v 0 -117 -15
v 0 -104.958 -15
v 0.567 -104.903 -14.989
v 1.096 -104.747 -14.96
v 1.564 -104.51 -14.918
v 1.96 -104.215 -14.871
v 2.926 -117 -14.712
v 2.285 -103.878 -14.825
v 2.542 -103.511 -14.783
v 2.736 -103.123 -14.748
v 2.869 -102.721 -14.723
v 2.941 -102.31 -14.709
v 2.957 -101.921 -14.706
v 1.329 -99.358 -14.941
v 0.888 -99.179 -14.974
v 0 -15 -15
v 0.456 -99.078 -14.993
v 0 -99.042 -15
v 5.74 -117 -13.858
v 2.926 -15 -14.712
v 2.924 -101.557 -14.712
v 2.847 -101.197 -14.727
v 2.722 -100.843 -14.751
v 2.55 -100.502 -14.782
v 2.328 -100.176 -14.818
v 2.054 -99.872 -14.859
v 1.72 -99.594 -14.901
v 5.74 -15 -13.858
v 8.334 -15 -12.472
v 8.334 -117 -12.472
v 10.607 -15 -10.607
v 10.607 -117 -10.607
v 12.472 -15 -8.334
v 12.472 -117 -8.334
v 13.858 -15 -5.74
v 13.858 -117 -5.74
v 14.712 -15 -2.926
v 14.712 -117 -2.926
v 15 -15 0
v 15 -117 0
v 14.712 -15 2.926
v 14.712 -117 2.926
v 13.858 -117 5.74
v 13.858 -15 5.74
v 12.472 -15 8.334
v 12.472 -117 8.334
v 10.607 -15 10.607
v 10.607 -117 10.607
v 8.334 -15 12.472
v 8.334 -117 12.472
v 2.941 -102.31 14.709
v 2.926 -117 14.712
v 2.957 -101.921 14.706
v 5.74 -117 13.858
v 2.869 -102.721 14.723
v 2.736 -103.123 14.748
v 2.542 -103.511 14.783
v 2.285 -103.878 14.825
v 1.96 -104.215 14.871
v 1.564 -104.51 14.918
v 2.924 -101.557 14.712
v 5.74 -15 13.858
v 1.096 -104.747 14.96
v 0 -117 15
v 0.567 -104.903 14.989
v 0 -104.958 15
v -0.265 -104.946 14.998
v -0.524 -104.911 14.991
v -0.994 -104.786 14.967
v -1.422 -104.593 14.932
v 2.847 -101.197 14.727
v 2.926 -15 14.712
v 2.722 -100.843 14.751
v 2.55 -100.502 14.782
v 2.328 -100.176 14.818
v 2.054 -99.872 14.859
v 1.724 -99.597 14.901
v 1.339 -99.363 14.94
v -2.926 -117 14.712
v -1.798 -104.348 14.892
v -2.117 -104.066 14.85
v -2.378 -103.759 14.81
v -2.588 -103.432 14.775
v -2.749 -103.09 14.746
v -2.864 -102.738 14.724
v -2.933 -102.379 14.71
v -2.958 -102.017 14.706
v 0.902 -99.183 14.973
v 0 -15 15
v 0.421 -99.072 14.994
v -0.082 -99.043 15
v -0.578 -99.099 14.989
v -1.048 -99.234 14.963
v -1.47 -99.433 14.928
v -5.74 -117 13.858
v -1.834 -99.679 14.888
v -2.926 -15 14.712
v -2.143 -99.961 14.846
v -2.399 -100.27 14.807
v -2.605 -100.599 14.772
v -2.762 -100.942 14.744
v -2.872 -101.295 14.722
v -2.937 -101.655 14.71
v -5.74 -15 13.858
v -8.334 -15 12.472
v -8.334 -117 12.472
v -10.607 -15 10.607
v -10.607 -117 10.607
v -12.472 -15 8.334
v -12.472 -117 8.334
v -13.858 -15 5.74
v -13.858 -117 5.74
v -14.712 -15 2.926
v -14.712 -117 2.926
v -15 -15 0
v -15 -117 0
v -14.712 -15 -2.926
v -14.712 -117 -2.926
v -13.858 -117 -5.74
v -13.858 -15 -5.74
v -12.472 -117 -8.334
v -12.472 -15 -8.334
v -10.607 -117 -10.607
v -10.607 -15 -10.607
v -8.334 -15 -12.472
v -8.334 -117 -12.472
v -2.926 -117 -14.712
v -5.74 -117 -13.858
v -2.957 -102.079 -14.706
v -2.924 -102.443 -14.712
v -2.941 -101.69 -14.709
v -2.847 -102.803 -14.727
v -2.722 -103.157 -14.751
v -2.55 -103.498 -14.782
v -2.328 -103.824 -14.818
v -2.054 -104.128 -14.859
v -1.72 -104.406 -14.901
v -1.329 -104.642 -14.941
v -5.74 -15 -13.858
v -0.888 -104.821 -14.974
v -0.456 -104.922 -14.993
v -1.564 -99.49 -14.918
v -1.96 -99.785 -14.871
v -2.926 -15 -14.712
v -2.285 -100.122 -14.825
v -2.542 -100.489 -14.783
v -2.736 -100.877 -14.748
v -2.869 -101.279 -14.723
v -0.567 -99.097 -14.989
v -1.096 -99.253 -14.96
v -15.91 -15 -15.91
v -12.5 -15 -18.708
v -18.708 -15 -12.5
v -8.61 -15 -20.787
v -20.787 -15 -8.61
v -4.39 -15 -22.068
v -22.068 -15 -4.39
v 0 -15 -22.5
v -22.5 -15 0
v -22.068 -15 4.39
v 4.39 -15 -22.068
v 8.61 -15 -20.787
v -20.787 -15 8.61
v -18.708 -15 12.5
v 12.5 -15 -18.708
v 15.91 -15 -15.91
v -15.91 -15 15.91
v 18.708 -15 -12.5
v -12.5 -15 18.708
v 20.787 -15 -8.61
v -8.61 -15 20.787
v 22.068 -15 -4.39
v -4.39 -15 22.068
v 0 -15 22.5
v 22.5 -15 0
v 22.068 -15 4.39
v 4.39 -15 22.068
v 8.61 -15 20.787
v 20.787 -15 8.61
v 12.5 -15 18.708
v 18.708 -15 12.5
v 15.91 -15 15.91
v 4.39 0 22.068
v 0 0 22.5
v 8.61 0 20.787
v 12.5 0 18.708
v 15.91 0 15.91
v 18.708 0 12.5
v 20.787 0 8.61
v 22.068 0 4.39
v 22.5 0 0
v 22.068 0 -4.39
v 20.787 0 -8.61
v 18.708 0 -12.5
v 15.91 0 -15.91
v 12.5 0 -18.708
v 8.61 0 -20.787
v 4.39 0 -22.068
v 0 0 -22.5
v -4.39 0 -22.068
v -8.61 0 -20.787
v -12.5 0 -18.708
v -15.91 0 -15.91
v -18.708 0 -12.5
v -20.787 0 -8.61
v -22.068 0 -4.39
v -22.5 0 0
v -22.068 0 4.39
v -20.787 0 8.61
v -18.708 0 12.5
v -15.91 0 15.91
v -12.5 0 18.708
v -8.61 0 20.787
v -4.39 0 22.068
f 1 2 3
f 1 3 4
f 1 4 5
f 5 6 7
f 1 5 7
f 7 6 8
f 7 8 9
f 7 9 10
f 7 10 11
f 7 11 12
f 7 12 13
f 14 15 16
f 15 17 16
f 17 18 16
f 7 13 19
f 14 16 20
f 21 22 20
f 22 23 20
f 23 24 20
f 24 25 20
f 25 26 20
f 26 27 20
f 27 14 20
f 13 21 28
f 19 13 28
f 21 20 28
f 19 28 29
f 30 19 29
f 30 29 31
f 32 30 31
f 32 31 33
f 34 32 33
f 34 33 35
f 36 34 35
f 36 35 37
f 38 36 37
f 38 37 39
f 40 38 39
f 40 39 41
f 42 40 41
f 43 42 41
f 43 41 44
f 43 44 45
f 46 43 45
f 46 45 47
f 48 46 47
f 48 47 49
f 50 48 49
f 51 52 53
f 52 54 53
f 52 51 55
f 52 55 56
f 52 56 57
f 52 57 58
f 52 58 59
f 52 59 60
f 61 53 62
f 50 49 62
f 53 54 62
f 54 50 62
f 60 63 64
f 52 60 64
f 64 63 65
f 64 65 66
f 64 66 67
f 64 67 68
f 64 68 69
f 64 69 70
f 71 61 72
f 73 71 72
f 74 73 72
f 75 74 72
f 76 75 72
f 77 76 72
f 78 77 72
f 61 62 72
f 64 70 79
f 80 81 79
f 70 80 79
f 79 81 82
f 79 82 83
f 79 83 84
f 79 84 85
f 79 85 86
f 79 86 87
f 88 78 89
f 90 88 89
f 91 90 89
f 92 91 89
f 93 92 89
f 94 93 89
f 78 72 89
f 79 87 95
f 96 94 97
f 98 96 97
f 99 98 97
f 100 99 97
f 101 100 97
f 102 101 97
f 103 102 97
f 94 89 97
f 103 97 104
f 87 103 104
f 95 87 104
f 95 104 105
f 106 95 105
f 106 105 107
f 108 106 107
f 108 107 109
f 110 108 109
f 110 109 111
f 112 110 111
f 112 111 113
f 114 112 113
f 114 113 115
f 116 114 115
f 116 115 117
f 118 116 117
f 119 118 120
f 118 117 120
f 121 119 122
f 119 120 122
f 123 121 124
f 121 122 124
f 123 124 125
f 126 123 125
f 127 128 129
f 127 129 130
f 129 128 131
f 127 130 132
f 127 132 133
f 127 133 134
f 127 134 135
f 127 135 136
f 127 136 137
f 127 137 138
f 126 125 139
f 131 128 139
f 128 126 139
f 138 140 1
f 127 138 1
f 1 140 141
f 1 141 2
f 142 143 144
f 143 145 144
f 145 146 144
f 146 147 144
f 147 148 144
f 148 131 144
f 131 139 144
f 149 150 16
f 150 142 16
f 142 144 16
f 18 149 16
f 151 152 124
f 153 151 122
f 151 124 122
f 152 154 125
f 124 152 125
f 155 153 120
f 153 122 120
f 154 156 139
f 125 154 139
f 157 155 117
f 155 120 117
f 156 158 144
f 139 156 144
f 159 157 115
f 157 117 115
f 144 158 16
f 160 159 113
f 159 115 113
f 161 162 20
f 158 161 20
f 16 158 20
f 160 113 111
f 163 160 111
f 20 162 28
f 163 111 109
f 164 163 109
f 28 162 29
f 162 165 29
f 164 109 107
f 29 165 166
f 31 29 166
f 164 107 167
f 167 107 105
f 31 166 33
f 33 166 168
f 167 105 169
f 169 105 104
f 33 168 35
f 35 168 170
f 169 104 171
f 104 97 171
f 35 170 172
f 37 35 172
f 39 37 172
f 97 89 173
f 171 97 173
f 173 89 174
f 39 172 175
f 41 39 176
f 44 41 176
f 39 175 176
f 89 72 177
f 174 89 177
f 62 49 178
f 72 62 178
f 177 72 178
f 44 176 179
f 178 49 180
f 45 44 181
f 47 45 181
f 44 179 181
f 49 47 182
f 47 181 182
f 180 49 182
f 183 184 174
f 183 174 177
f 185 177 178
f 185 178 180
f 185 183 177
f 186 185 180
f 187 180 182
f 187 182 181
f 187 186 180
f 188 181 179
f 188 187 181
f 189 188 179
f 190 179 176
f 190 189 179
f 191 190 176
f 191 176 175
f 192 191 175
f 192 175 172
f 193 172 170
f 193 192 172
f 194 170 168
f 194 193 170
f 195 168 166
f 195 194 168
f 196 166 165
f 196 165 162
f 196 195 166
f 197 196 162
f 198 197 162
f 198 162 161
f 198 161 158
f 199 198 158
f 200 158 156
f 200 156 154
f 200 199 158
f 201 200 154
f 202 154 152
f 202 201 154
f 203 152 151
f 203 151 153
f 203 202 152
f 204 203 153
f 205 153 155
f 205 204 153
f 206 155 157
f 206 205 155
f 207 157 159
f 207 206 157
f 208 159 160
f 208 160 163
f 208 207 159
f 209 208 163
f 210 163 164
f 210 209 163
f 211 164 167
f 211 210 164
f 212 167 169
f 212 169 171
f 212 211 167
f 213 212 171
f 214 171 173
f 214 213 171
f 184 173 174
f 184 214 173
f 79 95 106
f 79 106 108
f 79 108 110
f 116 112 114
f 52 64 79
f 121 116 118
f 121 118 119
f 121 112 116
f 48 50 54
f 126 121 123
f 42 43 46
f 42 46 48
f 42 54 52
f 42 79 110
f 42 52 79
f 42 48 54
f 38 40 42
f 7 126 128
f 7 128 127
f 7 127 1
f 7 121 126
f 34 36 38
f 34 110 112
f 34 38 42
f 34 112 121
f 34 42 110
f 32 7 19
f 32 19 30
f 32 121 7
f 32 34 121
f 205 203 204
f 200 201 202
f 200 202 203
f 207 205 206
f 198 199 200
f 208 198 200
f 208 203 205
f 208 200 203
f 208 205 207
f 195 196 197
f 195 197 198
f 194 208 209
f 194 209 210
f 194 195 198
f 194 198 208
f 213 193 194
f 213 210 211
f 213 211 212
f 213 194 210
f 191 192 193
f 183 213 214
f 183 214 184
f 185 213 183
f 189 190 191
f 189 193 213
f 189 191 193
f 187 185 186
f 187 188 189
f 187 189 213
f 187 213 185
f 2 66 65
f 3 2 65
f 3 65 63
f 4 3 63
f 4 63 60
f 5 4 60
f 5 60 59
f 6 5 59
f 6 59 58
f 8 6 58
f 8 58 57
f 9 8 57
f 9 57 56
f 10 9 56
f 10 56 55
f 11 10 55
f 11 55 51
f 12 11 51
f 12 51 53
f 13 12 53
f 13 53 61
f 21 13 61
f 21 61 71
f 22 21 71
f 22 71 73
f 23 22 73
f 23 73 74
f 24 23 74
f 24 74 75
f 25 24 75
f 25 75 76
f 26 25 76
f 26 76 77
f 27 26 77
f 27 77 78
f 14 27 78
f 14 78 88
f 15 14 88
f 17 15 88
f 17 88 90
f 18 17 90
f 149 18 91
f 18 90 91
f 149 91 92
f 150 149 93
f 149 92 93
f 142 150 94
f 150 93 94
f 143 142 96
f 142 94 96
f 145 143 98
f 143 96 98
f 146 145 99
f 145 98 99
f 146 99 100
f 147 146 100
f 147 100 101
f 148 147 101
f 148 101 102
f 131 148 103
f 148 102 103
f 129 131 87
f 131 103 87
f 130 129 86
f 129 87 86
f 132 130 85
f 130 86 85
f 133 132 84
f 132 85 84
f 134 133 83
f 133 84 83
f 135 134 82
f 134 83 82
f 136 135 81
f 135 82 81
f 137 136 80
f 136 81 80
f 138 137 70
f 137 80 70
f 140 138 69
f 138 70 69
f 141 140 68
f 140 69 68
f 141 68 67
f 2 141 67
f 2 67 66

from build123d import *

# Parameters (mm, degrees)
CROQUIS1_R              = 22.5
SALIENTE_EXTRUIR1_DEPTH = 15
CROQUIS2_R              = 15
SALIENTE_EXTRUIR2_DEPTH = 102
CROQUIS4_R              = 2.957727645
CORTAR_EXTRUIR1_DEPTH   = 48.5


with BuildPart() as part:
    # Croquis1 → Saliente-Extruir1 (new body)
    with BuildSketch(Plane(origin=(0, 0, 0), x_dir=(1, 0, 0), z_dir=(0, 1, 0))):
        with Locations(Location((0, 0, 0), (0, 0, 270))):
            Circle(CROQUIS1_R)
    extrude(amount=-SALIENTE_EXTRUIR1_DEPTH)

    # Croquis2 → Saliente-Extruir2 (add)
    with BuildSketch(Plane.XZ.offset(15)):
        with Locations(Location((0, 0, 0), (0, 0, 270))):
            Circle(CROQUIS2_R)
    extrude(amount=SALIENTE_EXTRUIR2_DEPTH)

    # Croquis4 → Cortar-Extruir1 (cut, symmetric)
    with BuildSketch(Plane.XY):
        with Locations(Location((0, -102, 0), (0, 0, 269.999999959))):
            Circle(CROQUIS4_R)
    extrude(amount=CORTAR_EXTRUIR1_DEPTH, both=True, mode=Mode.SUBTRACT)


solid = part.part
